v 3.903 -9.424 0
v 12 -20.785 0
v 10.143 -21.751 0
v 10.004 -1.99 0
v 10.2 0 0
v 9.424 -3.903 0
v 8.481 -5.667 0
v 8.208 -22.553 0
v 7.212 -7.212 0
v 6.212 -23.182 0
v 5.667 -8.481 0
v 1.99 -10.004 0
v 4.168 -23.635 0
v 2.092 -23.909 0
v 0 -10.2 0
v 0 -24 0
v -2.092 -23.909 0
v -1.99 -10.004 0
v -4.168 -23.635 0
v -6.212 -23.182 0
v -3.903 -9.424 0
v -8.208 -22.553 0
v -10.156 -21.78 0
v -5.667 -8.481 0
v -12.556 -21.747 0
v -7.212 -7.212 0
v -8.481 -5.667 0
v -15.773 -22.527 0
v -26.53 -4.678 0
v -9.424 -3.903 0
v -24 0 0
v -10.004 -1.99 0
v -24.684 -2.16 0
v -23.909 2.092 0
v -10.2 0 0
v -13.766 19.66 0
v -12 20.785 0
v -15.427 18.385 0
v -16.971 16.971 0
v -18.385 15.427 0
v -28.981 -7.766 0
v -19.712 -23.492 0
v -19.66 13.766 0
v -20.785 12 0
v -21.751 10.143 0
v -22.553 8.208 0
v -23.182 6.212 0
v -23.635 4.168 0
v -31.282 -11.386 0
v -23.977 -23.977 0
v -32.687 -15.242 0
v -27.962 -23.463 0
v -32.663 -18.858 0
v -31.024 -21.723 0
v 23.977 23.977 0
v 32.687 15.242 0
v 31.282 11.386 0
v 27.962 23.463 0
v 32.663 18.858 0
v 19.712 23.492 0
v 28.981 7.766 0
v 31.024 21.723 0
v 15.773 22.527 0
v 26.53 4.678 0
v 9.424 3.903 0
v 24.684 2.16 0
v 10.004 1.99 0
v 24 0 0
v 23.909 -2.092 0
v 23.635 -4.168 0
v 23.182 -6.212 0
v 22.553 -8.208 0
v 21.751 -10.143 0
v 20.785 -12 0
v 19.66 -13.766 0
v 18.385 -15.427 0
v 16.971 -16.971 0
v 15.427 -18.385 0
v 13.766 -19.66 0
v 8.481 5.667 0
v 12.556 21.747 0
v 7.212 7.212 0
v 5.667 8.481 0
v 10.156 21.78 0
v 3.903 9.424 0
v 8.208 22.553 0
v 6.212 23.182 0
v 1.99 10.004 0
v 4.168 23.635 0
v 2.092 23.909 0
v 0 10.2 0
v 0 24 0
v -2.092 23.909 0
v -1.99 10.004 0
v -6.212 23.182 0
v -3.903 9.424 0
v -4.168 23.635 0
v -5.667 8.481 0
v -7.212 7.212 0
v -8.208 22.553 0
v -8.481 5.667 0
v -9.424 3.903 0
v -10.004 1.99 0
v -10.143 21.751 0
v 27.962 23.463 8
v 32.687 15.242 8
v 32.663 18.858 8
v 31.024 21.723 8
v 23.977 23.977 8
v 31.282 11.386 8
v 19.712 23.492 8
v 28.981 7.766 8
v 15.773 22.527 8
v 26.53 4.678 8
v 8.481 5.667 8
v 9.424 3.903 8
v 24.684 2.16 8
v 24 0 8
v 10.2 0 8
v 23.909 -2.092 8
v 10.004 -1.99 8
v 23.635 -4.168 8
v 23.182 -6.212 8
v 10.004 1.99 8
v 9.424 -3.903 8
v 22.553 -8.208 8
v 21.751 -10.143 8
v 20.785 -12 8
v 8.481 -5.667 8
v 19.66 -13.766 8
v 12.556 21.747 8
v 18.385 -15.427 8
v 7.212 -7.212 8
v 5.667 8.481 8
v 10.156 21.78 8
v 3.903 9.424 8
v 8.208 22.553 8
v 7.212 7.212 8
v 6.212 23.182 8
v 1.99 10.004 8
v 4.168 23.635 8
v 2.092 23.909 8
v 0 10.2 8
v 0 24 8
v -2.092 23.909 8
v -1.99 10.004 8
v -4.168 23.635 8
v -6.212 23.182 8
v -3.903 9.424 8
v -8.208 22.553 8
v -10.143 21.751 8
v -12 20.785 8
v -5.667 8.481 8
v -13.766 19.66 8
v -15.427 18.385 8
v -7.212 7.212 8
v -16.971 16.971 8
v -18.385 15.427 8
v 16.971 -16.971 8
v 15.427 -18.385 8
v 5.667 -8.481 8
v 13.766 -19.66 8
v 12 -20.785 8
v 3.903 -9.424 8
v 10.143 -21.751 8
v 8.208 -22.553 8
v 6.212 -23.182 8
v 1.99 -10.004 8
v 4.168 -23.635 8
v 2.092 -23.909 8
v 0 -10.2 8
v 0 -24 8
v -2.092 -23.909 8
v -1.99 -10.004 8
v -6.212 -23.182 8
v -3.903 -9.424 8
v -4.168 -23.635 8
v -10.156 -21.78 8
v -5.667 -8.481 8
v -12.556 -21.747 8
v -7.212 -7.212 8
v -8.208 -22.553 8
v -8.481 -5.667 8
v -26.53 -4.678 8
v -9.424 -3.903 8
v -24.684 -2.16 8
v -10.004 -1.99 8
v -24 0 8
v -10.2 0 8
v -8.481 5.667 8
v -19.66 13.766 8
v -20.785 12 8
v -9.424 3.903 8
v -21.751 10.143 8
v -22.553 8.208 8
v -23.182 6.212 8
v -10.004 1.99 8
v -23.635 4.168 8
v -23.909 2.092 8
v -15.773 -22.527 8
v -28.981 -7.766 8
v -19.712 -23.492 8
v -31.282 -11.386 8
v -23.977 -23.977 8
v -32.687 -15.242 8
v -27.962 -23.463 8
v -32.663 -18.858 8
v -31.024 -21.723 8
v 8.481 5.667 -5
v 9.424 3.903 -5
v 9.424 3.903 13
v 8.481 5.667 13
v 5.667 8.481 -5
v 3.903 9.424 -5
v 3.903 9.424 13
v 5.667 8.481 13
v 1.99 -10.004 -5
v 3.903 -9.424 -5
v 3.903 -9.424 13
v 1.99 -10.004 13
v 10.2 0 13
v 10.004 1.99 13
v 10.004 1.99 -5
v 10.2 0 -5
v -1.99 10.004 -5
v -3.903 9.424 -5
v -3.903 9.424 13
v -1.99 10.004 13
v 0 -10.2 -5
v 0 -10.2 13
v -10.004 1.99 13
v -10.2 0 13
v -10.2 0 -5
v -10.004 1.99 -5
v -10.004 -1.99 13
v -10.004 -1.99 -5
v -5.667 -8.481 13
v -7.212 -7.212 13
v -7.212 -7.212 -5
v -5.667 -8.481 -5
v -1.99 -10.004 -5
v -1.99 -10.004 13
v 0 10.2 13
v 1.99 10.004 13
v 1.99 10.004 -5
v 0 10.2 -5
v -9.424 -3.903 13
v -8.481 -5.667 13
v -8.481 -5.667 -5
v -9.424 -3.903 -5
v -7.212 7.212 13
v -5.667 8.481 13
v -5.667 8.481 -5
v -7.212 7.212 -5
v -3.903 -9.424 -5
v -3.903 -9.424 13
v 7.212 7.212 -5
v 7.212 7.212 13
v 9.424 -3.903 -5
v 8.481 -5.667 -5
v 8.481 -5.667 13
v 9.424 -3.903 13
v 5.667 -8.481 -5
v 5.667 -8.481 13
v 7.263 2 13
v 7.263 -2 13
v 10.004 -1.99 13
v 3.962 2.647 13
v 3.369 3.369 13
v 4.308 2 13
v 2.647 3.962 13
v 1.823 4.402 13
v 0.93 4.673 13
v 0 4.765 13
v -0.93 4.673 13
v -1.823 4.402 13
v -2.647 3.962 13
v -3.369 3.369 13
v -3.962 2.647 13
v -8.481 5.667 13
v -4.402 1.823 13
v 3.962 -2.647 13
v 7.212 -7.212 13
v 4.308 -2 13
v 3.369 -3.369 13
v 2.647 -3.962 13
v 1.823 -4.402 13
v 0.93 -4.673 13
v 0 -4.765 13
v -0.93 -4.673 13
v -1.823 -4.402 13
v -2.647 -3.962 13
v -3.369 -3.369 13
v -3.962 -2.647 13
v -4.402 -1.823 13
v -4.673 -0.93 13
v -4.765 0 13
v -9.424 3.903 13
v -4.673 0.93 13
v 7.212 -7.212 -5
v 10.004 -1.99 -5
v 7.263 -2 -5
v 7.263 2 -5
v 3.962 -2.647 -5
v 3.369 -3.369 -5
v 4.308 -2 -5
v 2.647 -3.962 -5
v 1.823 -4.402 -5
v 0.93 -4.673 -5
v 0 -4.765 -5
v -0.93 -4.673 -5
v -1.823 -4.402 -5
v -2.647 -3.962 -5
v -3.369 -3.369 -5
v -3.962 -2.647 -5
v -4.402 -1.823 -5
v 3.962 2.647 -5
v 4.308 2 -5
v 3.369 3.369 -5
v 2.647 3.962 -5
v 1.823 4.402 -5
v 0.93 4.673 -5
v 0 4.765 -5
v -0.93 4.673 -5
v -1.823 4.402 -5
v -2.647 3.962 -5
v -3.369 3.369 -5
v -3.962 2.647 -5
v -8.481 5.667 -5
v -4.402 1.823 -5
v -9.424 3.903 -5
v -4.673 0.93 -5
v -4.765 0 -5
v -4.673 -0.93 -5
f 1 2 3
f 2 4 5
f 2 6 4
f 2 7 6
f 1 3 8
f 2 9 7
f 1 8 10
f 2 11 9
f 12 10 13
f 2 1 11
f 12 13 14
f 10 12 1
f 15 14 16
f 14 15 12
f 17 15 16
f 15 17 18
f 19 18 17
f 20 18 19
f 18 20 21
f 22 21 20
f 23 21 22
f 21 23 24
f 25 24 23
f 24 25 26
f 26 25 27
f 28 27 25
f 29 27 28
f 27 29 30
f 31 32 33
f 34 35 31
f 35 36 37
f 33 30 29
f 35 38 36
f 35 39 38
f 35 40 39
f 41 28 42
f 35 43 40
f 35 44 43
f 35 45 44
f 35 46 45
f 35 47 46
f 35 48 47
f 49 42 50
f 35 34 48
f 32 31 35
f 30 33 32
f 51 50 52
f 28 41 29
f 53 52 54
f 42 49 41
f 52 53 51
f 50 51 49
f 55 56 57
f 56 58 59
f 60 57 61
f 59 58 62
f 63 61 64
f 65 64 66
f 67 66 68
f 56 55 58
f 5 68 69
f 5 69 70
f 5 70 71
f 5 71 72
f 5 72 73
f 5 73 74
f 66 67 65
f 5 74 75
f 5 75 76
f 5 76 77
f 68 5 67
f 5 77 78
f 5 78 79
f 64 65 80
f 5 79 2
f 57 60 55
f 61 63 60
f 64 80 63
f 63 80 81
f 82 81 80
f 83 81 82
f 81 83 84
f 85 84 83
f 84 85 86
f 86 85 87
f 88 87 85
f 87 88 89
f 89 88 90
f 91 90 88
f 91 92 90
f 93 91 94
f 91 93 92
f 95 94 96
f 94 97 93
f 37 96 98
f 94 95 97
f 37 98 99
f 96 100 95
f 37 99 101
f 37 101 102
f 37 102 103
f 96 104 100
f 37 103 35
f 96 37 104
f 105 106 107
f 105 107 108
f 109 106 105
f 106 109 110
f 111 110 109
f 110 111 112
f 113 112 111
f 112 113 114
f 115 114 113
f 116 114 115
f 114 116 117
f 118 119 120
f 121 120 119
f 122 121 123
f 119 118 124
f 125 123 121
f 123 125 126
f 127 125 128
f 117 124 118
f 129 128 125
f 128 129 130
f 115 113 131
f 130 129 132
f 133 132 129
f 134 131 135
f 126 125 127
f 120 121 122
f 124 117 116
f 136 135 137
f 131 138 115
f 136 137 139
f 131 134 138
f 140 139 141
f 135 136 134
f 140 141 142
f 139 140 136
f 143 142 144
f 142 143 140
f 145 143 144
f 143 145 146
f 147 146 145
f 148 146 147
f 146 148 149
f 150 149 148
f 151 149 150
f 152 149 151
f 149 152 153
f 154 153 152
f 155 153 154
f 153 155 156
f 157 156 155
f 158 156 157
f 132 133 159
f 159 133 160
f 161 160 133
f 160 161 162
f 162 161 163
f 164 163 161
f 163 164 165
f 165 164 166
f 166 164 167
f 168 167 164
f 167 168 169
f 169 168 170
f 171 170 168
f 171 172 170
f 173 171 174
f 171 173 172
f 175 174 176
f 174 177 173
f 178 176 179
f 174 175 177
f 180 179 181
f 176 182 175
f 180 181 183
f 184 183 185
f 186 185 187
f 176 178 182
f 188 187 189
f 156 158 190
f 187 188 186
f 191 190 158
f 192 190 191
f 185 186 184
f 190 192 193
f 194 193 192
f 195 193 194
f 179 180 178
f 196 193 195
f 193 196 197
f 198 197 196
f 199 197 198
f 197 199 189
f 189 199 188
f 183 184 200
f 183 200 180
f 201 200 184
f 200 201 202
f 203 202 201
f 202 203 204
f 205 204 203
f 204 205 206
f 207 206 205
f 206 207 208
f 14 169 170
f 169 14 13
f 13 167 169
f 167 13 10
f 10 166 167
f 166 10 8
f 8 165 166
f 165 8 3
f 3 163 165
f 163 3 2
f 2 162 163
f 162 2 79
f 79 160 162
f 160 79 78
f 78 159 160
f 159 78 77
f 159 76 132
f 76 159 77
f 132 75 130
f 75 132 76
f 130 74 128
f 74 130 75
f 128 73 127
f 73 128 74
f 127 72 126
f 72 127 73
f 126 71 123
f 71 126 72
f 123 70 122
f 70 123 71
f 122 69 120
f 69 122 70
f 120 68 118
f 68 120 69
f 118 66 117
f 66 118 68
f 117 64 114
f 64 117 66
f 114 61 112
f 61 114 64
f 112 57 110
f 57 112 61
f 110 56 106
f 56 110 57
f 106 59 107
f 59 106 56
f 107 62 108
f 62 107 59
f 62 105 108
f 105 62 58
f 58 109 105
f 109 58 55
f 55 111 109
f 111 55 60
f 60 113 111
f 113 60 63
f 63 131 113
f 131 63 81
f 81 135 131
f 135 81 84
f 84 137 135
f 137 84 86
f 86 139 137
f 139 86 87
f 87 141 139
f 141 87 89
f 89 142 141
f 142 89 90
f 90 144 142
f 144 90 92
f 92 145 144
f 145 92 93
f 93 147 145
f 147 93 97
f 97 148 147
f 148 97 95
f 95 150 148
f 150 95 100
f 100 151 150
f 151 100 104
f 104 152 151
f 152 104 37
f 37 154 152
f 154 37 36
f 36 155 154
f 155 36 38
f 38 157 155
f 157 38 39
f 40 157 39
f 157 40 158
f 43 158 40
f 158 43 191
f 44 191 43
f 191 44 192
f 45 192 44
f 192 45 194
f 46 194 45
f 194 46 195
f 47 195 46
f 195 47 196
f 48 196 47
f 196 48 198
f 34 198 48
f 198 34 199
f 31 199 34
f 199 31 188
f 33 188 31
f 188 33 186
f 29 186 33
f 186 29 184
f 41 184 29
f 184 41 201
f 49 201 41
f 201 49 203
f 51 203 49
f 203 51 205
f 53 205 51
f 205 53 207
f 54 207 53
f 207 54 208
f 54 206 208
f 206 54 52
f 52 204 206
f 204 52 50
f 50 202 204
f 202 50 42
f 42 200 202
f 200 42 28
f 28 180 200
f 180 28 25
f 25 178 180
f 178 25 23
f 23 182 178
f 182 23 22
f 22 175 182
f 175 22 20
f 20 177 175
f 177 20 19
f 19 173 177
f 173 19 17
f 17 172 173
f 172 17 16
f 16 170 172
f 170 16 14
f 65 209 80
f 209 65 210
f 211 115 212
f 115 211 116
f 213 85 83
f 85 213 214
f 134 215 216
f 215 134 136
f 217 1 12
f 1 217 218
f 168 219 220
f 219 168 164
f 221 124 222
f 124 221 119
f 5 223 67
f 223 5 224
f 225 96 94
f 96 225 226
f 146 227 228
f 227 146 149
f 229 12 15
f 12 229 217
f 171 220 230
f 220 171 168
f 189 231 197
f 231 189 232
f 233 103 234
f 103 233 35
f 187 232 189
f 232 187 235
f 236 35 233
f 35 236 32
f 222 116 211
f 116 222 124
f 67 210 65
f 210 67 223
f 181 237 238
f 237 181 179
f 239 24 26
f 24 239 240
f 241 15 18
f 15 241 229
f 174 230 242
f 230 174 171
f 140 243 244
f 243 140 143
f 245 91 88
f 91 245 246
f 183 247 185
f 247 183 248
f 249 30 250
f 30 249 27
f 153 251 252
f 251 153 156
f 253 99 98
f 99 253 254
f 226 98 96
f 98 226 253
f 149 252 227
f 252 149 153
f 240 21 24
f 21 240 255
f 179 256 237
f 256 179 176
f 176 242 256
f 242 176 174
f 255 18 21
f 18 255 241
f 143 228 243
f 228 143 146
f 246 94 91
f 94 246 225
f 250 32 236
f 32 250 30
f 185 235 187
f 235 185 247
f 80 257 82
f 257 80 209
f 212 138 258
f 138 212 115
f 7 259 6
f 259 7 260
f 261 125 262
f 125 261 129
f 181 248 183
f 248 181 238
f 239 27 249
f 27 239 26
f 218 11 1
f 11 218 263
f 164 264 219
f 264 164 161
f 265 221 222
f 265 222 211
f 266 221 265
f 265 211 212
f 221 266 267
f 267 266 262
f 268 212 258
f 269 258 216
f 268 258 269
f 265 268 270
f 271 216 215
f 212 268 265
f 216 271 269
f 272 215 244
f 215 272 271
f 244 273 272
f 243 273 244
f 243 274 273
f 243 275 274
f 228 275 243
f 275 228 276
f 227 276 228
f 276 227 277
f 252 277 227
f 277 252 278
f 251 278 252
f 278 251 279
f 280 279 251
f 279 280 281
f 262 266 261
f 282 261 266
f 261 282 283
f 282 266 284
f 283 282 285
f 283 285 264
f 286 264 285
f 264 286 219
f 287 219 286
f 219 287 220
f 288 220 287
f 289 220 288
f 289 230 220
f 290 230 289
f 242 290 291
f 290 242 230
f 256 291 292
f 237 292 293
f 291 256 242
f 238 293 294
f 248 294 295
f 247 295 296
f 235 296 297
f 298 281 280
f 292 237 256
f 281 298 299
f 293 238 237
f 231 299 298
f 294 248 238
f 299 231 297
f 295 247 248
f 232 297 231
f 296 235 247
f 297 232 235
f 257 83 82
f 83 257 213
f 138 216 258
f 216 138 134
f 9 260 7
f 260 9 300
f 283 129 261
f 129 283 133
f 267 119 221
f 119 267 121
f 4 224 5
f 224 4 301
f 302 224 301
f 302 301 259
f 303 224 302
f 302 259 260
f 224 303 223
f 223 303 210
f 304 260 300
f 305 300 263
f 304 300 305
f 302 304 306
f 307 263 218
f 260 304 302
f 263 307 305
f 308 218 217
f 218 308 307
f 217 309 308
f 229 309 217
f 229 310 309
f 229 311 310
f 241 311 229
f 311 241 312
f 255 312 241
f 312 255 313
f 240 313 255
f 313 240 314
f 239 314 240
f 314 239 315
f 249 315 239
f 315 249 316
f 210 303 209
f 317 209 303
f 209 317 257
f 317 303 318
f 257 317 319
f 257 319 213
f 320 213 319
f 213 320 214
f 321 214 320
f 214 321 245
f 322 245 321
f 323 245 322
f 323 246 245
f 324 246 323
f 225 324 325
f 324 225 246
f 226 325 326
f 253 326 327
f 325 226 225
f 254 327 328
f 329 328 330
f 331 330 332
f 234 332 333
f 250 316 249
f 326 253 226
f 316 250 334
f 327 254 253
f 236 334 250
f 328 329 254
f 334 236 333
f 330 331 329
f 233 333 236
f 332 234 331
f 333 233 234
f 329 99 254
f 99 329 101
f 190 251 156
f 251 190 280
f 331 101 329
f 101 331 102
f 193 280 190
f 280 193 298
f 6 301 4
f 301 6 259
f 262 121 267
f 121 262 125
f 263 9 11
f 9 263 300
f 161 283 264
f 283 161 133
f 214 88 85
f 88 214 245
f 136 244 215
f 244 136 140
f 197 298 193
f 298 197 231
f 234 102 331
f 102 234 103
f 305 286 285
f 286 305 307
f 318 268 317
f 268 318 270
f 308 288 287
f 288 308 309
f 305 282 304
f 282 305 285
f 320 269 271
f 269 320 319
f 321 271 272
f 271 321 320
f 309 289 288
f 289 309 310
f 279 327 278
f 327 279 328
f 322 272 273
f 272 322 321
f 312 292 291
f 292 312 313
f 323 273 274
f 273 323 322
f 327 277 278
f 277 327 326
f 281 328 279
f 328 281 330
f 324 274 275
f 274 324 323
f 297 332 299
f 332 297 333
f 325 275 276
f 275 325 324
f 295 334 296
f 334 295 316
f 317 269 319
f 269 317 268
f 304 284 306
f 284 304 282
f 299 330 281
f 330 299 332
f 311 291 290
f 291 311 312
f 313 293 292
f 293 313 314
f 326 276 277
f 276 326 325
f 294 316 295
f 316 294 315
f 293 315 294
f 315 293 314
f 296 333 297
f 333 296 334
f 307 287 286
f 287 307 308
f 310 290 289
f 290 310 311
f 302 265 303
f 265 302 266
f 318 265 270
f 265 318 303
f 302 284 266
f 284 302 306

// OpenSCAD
$fn = 32;

// ----------------------------------------------------------------------
// Cam: base radius 24 mm with a 14 mm lift over 120 degrees
// ----------------------------------------------------------------------

// --- parameters (mm) ---
base_r = 24;              // base radius
lift = 14;                // lift height above the base radius
lift_span = 120;          // angular width of the lift
lift_start = 0;           // angle where the lift starts
cam_t = 8;                // cam plate thickness
hub_d = 20.4;             // hub diameter
hub_h = 18;               // hub height
bore_d = 9.53;            // bore
key_w = 4;                // keyway width
key_depth = 2;            // keyway depth

cam_profile = [[24, 0], [24.684, 2.16], [26.53, 4.678], [28.981, 7.766], [31.282, 11.386], [32.687, 15.242], [32.663, 18.858], [31.024, 21.723], [27.962, 23.463], [23.977, 23.977], [19.712, 23.492], [15.773, 22.527], [12.556, 21.747], [10.156, 21.78], [8.208, 22.553], [6.212, 23.182], [4.168, 23.635], [2.092, 23.909], [0, 24], [-2.092, 23.909], [-4.168, 23.635], [-6.212, 23.182], [-8.208, 22.553], [-10.143, 21.751], [-12, 20.785], [-13.766, 19.66], [-15.427, 18.385], [-16.971, 16.971], [-18.385, 15.427], [-19.66, 13.766], [-20.785, 12], [-21.751, 10.143], [-22.553, 8.208], [-23.182, 6.212], [-23.635, 4.168], [-23.909, 2.092], [-24, 0], [-24.684, -2.16], [-26.53, -4.678], [-28.981, -7.766], [-31.282, -11.386], [-32.687, -15.242], [-32.663, -18.858], [-31.024, -21.723], [-27.962, -23.463], [-23.977, -23.977], [-19.712, -23.492], [-15.773, -22.527], [-12.556, -21.747], [-10.156, -21.78], [-8.208, -22.553], [-6.212, -23.182], [-4.168, -23.635], [-2.092, -23.909], [0, -24], [2.092, -23.909], [4.168, -23.635], [6.212, -23.182], [8.208, -22.553], [10.143, -21.751], [12, -20.785], [13.766, -19.66], [15.427, -18.385], [16.971, -16.971], [18.385, -15.427], [19.66, -13.766], [20.785, -12], [21.751, -10.143], [22.553, -8.208], [23.182, -6.212], [23.635, -4.168], [23.909, -2.092]];

difference() {
  union() {
    linear_extrude(height = cam_t) polygon(cam_profile);
    /* hub, proud of the cam plate on both sides */
    translate([0, 0, -5]) cylinder(h = hub_h, d = hub_d);
  }
  /* bore through the hub, 2.5 mm clear on both faces */
  translate([0, 0, -7.5]) cylinder(h = hub_h + 5, d = bore_d);
  /* keyway, milled through the whole hub */
  translate([2.763, -2, -7.5]) cube([4.5, 4, 23]);
}
